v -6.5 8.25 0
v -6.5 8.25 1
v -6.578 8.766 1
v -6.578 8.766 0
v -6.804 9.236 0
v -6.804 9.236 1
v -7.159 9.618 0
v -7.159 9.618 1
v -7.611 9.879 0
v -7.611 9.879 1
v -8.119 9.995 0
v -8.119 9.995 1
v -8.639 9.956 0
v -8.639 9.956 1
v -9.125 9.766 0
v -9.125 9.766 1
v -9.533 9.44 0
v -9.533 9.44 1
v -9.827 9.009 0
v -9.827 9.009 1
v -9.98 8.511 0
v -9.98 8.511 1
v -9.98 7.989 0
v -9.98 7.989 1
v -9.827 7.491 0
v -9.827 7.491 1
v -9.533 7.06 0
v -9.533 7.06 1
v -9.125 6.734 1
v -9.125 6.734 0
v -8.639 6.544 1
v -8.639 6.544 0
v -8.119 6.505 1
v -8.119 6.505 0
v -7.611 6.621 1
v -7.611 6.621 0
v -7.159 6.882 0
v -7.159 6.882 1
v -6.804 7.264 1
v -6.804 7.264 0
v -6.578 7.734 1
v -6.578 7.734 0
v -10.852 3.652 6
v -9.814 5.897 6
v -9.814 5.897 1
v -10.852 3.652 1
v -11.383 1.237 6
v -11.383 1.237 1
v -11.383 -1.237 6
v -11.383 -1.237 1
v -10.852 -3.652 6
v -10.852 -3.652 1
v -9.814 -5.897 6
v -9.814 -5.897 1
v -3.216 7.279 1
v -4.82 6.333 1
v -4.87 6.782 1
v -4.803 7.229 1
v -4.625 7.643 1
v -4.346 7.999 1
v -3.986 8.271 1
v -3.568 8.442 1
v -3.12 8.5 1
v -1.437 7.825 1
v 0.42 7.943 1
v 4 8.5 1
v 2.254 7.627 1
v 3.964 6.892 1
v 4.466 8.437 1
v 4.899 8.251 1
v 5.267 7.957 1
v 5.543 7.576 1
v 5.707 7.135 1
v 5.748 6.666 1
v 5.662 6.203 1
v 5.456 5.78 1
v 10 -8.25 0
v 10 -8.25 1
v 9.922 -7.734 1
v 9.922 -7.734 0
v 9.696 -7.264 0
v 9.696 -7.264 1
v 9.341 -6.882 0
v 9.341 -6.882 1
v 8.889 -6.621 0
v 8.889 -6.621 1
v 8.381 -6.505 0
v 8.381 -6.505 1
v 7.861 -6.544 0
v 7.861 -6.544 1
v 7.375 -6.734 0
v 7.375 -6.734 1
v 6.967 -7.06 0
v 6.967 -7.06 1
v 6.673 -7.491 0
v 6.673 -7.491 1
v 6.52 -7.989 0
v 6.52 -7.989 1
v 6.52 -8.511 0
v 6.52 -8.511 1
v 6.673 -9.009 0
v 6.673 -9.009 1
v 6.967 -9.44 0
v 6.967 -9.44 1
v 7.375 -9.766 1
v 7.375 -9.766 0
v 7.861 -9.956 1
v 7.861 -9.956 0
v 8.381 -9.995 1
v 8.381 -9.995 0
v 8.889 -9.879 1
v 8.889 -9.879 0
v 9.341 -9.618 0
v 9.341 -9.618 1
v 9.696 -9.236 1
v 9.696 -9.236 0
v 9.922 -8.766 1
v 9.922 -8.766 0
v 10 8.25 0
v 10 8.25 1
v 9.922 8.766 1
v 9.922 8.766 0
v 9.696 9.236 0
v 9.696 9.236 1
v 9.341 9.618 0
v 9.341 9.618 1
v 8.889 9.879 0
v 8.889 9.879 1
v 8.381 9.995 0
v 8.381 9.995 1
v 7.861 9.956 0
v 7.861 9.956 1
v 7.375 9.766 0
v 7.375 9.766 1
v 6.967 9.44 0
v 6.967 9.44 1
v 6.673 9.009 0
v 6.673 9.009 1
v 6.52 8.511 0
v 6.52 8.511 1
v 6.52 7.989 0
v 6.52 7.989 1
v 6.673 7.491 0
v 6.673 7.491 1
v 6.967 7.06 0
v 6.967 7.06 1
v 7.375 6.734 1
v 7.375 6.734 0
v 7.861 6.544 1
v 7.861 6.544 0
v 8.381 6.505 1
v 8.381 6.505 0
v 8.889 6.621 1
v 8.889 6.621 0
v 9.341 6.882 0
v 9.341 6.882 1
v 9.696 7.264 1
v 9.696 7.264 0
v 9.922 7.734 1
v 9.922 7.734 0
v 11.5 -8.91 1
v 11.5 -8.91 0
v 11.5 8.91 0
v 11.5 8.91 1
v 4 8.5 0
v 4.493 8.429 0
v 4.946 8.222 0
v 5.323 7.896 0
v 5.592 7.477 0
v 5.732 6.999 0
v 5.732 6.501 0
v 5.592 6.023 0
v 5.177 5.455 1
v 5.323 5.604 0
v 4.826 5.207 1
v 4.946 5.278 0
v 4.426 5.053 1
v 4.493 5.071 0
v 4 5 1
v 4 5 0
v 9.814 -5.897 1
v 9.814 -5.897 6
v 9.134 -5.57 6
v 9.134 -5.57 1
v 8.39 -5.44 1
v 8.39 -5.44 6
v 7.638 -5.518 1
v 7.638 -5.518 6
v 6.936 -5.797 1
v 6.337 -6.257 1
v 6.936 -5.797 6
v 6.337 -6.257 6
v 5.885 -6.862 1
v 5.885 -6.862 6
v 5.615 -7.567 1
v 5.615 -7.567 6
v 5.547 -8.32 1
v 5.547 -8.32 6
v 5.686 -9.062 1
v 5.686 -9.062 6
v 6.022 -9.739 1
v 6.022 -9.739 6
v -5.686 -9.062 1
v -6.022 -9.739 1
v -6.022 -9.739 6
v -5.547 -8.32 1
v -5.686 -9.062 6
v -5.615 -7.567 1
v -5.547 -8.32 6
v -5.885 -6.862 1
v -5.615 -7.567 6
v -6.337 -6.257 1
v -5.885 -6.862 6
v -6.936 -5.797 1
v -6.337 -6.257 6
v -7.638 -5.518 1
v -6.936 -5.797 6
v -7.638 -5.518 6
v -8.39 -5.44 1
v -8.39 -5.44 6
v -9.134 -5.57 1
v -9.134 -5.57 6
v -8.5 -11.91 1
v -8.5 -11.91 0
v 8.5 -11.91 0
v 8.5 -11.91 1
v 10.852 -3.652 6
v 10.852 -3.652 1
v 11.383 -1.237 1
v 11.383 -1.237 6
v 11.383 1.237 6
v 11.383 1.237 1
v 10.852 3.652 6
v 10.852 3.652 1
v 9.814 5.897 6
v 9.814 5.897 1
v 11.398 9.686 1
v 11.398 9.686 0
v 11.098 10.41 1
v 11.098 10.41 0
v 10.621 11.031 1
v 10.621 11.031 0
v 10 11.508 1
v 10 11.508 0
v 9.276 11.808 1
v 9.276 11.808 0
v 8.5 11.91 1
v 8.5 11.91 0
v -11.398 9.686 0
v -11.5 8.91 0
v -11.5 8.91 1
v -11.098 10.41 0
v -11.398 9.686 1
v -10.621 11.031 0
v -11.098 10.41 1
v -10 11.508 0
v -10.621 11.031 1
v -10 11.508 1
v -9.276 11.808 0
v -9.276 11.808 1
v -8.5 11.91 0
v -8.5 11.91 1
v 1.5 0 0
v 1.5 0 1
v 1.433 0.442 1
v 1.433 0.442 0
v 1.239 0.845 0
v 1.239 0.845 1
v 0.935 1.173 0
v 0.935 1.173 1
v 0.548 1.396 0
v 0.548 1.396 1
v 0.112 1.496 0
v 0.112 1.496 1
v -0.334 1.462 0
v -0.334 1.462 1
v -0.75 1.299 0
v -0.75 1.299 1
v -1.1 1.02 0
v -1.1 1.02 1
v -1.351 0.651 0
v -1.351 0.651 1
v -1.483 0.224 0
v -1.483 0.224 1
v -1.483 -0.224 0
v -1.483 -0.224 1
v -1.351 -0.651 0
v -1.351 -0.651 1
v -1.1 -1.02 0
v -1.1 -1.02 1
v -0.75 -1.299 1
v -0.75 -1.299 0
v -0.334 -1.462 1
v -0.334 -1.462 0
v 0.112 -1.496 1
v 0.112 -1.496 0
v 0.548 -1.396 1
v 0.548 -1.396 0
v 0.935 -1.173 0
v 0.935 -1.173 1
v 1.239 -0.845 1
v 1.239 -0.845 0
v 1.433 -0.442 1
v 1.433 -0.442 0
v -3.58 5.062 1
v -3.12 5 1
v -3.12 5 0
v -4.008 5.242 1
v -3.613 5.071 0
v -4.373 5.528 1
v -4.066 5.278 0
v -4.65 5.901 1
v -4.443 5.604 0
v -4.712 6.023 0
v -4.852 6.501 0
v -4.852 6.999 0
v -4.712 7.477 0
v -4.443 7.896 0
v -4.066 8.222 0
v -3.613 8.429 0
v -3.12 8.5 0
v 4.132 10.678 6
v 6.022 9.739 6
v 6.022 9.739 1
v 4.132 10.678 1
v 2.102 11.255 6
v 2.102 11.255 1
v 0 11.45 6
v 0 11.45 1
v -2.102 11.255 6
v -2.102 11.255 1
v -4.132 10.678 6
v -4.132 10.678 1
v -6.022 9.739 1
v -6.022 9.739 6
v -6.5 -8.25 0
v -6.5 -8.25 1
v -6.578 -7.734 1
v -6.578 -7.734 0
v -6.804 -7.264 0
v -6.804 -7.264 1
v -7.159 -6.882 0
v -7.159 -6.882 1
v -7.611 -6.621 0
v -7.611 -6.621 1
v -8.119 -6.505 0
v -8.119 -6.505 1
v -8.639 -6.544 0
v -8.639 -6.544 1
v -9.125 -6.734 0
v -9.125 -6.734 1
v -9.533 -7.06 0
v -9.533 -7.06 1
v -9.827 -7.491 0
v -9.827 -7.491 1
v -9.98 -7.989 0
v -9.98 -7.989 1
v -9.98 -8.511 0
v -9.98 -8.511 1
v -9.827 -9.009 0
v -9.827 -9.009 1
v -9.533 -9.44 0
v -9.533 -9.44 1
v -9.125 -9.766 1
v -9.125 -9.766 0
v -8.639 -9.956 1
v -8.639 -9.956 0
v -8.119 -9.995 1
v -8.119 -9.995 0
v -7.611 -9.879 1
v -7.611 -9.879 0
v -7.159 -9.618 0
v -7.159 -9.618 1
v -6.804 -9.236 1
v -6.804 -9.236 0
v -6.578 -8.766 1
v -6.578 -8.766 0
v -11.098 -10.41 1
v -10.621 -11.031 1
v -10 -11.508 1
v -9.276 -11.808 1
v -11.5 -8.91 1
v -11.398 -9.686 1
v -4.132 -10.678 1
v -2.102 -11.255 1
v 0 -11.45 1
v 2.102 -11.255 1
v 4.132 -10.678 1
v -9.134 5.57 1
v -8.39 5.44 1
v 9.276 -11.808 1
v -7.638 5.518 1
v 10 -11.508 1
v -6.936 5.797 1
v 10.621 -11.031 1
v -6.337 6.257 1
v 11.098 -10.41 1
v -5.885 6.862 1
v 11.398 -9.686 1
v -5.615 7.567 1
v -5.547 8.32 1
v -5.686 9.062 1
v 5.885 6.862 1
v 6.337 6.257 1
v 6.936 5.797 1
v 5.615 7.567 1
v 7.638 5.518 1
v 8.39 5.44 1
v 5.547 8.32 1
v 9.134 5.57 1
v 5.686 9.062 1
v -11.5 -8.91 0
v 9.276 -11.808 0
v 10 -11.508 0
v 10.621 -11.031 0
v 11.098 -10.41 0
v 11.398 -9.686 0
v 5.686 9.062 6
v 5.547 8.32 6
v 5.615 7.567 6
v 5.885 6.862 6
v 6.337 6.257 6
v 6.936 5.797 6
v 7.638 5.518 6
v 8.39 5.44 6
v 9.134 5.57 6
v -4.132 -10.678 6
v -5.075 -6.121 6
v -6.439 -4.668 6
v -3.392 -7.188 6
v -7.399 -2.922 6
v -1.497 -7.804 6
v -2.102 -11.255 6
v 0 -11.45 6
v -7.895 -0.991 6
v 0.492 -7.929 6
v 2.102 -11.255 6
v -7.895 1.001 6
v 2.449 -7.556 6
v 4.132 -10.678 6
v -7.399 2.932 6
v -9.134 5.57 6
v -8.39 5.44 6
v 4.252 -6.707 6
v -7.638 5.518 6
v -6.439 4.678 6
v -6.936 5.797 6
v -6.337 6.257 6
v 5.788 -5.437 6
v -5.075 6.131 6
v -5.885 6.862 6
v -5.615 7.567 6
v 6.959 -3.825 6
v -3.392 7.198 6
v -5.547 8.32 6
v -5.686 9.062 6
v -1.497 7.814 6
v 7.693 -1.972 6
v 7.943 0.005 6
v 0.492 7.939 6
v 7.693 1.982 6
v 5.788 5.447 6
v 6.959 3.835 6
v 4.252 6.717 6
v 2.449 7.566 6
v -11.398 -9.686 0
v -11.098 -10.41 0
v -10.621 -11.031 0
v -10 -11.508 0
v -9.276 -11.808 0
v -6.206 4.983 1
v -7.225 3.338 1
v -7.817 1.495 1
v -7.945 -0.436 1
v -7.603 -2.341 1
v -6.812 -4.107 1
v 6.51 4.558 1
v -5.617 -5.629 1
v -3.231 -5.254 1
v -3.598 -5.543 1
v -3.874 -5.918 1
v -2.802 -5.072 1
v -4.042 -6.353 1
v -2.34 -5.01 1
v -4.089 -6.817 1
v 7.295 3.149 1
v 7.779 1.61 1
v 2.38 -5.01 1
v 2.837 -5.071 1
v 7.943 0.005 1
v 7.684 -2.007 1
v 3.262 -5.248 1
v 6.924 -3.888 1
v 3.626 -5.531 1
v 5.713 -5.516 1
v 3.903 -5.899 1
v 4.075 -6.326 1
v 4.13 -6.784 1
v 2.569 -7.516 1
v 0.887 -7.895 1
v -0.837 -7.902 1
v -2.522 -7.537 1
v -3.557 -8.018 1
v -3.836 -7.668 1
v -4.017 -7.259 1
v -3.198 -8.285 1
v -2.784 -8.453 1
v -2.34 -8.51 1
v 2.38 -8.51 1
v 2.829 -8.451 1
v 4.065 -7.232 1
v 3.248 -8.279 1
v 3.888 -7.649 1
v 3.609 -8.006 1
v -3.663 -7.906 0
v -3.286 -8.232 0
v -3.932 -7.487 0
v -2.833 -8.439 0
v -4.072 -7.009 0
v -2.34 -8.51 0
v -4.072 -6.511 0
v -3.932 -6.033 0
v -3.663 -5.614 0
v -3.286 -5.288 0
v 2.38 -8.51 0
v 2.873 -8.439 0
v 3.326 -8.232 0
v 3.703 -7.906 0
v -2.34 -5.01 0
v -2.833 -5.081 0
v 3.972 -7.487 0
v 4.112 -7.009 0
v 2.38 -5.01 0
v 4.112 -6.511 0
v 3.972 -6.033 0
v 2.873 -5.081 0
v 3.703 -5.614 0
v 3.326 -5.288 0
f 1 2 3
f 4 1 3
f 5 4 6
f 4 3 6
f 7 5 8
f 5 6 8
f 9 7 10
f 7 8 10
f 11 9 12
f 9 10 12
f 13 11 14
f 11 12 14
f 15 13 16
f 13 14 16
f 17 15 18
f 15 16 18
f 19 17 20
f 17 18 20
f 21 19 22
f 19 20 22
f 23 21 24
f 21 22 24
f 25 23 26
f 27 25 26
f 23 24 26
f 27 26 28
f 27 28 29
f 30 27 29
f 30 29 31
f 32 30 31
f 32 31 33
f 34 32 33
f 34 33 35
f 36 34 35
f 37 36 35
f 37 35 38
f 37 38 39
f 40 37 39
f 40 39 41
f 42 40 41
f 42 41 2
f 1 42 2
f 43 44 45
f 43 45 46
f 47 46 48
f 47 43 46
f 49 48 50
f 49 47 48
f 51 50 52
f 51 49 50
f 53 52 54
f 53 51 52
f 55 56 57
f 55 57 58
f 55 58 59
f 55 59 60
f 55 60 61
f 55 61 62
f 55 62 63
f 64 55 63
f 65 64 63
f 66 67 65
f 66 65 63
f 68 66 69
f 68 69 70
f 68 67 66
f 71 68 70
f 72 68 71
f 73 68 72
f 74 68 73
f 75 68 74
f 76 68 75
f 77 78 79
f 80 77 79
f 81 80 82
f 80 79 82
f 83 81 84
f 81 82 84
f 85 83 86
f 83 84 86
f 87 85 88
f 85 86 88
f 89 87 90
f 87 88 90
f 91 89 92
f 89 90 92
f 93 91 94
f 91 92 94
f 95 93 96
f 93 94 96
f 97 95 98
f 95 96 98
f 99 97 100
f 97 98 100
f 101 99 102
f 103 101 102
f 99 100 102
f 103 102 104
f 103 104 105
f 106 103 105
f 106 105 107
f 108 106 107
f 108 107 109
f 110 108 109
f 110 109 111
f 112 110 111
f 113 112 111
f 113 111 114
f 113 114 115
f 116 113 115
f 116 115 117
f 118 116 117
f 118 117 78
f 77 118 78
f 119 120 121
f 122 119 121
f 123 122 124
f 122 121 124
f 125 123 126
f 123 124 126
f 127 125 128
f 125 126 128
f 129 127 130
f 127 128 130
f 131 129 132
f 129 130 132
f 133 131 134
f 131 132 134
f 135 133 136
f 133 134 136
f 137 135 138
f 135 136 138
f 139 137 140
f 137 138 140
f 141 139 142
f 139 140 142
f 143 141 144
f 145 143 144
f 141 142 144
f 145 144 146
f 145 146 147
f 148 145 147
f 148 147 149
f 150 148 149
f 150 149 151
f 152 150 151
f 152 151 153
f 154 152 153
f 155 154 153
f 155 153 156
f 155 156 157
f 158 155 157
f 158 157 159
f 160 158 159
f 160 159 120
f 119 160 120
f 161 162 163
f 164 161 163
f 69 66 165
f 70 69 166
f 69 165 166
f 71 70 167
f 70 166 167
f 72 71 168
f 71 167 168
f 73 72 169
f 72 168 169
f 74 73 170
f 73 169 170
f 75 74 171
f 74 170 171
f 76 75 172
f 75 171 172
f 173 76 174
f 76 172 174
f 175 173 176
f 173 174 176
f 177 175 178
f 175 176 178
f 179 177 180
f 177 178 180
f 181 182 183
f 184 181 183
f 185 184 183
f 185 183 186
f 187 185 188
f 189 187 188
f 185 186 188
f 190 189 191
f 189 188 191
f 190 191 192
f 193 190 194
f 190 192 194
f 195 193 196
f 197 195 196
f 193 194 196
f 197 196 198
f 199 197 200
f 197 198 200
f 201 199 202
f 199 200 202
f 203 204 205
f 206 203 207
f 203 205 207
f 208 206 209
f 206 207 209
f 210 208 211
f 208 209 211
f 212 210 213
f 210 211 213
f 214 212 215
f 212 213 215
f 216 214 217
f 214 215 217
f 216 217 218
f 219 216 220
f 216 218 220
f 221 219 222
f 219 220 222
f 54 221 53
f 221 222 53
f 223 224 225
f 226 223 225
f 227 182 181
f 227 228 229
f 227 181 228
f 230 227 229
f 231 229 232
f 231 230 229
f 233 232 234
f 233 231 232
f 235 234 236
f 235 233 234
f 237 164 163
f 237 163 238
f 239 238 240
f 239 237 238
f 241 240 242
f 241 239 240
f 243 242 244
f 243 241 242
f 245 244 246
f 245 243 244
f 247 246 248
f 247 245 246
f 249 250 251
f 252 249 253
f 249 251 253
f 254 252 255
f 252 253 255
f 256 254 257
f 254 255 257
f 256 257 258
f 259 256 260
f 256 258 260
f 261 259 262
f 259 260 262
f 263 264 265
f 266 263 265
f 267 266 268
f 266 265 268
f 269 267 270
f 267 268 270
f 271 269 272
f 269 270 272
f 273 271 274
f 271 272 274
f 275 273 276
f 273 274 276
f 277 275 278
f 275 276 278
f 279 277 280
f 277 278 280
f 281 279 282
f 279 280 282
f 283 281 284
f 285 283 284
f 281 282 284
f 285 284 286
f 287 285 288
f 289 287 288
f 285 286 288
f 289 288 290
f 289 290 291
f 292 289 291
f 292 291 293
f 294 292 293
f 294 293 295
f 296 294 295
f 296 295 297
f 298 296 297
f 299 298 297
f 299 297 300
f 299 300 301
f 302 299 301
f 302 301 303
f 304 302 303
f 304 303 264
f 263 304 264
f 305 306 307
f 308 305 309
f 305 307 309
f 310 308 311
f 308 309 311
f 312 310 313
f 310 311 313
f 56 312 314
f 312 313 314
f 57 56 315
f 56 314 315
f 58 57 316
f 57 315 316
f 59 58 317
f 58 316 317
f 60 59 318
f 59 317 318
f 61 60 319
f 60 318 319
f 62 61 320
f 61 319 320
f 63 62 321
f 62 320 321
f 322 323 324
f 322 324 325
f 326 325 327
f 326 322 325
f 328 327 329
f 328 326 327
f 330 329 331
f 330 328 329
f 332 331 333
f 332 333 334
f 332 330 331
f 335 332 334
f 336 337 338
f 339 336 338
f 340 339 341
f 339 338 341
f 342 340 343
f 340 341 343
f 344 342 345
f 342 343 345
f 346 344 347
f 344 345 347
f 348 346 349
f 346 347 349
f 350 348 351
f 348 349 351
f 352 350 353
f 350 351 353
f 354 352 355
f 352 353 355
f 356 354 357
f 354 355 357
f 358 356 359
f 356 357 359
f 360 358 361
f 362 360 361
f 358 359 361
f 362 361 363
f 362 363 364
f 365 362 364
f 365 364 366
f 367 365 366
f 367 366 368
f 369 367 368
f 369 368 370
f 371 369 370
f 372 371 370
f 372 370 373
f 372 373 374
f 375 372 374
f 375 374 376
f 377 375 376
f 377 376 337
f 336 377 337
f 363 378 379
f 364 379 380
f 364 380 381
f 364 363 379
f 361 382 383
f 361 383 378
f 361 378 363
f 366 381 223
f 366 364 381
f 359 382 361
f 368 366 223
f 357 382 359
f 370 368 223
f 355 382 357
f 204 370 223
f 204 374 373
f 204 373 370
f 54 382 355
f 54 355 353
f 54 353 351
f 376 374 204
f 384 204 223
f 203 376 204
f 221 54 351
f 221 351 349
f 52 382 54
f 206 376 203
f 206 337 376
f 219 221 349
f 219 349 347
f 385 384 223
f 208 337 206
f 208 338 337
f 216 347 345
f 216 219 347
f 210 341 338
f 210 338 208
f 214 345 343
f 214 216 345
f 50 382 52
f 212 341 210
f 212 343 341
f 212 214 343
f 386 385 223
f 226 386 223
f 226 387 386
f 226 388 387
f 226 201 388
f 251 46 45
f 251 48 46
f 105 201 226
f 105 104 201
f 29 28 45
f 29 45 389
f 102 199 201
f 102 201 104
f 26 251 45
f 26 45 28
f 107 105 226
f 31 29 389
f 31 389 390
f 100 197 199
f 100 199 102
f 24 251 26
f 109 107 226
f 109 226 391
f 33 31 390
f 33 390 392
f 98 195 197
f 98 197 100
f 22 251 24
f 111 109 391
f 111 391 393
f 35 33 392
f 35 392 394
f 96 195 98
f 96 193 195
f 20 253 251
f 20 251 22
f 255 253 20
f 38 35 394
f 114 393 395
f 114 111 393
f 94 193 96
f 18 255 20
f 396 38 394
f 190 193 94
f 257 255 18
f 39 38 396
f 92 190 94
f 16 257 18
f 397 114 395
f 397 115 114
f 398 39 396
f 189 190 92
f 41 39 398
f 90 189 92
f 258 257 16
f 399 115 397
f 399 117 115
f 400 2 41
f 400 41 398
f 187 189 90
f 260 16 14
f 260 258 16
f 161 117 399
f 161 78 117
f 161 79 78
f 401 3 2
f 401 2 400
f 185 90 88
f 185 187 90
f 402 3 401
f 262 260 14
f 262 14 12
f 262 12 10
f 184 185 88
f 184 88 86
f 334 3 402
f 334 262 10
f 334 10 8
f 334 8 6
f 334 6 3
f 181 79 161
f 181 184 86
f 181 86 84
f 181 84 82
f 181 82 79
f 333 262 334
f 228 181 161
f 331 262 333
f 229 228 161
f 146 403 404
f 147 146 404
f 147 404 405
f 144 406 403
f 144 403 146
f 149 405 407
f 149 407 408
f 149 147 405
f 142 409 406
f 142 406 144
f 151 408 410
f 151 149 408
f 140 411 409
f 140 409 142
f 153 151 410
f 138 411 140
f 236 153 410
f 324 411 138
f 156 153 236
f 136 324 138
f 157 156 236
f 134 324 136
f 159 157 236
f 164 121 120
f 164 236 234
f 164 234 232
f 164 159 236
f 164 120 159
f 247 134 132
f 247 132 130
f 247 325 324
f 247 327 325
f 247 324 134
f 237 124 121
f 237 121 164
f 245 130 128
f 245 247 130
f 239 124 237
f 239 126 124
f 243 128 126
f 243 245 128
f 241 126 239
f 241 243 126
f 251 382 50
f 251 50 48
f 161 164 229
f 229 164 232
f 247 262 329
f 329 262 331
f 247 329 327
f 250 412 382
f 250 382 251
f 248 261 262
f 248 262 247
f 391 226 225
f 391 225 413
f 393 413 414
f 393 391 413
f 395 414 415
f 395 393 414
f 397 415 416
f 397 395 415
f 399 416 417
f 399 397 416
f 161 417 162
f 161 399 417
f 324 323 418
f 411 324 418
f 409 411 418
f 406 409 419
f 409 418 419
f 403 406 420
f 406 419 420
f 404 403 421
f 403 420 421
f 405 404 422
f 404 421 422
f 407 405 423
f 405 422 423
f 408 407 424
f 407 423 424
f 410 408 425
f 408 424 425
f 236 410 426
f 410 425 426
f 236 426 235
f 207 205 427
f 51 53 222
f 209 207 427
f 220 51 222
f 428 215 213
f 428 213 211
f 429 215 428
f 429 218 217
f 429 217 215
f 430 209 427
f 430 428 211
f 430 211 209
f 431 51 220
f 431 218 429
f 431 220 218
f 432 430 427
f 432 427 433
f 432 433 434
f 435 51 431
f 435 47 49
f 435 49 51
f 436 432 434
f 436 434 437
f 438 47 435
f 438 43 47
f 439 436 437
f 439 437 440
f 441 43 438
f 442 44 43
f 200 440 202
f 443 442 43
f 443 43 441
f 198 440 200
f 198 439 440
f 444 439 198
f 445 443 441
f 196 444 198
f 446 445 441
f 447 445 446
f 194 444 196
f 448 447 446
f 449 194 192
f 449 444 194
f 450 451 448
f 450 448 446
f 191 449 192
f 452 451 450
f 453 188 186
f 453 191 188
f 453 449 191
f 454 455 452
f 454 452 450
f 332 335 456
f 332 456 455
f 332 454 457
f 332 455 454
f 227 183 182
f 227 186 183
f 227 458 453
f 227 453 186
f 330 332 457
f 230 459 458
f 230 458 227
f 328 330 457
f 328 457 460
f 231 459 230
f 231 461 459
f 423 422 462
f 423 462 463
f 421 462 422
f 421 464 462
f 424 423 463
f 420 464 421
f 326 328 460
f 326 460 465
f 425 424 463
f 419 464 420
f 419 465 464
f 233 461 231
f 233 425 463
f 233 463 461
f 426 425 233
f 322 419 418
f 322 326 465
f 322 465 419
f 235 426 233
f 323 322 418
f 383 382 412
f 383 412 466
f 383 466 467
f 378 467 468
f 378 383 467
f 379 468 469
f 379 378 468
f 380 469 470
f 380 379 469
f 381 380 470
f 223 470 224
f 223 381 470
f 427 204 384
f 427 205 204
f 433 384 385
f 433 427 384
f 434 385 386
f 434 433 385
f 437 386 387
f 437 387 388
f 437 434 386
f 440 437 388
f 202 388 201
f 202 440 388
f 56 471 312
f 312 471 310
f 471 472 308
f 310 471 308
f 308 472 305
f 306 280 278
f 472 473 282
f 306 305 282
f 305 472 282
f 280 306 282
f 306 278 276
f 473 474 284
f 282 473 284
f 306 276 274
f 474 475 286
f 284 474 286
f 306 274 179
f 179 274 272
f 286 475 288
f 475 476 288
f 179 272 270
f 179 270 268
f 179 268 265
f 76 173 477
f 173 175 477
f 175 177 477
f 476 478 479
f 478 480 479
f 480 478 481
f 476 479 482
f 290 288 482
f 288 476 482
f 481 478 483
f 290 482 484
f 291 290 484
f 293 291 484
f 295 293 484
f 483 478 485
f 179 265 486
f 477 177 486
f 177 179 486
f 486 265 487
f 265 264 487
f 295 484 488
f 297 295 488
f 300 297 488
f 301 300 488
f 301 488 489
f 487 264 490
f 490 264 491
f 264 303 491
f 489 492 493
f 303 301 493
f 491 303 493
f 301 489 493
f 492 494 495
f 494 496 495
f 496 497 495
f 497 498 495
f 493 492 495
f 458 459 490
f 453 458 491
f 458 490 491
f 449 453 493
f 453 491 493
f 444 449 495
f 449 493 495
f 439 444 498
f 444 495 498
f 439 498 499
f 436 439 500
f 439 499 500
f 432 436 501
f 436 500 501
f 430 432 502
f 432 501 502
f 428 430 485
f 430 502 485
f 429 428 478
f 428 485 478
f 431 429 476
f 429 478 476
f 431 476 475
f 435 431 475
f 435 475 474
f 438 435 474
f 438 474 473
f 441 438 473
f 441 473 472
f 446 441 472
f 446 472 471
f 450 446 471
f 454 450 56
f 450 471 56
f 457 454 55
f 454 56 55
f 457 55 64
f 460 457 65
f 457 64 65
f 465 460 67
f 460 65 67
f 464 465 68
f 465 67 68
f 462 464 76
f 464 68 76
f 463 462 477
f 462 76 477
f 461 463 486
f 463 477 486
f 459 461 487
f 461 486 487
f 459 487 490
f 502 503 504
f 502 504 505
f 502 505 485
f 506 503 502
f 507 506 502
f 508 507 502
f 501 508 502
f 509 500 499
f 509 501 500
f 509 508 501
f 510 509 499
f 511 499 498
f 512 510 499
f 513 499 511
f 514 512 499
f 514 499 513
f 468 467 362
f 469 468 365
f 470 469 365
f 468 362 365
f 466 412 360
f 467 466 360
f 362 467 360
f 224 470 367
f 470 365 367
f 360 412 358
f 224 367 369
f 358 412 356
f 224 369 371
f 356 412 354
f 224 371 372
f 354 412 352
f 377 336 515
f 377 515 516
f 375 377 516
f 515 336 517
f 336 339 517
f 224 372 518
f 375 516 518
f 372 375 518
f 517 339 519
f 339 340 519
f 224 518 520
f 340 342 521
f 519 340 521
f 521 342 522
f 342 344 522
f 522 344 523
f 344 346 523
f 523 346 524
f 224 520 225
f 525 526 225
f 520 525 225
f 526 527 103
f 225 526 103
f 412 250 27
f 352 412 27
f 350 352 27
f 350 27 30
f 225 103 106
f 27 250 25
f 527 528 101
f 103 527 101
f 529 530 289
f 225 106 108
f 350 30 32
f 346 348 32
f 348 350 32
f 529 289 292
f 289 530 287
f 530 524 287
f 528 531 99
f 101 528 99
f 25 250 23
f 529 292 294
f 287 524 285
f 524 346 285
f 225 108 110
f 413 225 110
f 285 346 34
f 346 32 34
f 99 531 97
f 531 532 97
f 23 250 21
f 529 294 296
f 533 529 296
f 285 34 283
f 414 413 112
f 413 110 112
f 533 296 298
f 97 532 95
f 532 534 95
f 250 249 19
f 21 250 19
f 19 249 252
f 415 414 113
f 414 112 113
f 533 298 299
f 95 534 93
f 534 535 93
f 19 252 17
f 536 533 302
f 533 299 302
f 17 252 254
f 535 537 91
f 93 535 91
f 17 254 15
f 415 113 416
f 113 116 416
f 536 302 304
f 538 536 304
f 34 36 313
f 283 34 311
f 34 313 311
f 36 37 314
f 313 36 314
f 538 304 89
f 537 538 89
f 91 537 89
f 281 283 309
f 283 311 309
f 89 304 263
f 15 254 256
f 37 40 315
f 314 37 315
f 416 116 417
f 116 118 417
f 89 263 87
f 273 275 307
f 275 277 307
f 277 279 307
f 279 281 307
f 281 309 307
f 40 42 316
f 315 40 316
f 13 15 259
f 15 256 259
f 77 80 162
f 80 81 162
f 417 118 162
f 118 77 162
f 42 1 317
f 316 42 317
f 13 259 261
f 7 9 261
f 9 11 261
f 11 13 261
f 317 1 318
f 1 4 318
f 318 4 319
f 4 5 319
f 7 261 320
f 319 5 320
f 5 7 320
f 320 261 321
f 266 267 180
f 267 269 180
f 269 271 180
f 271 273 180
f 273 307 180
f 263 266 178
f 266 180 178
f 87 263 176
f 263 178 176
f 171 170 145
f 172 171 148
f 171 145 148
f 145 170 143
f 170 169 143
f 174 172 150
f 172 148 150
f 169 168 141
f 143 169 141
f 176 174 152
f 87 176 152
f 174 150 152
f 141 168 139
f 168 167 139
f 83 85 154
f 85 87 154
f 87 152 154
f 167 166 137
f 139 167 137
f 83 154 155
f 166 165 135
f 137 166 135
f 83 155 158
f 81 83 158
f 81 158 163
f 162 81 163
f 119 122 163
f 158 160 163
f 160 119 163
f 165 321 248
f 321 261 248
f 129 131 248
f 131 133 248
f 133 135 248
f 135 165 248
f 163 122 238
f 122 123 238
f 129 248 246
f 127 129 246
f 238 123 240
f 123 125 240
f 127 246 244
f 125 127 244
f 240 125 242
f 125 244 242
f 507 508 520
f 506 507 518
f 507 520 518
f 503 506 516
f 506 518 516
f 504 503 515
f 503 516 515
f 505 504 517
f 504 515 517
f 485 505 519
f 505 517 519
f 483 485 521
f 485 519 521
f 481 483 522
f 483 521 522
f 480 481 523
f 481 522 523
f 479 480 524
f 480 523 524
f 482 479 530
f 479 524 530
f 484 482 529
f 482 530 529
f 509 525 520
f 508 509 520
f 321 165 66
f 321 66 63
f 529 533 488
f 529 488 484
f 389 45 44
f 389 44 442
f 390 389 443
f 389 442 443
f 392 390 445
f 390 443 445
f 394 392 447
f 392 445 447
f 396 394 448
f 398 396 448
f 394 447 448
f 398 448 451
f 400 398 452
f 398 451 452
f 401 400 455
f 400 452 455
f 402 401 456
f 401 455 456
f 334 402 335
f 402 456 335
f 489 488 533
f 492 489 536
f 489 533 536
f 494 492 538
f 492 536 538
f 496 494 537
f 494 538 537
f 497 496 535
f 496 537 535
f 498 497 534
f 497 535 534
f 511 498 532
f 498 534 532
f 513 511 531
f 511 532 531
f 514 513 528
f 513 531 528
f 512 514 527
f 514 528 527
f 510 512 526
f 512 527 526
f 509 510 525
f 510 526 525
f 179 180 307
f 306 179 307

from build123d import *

# Parameters (mm, degrees)
SKETCH_W        = 23
SKETCH_H        = 23.82
PAD_DEPTH       = 6
FILLET_R        = 3
POCKET_DEPTH    = 1
SKETCH001_W     = 40
SKETCH001_H     = 40
SKETCH001_R     = 11.45
POCKET001_DEPTH = 5
SKETCH004_R     = 7.95
POCKET002_DEPTH = 5
SKETCH006_R     = 1.75
HOLE_DEPTH      = 6.001
SKETCH007_R     = 2.75
POCKET004_DEPTH = 5
SKETCH008_R     = 1.5
HOLE001_DEPTH   = 25


with BuildPart() as part:
    # Sketch → Pad (new body)
    with BuildSketch(Plane.XY):
        Rectangle(SKETCH_W, SKETCH_H)
    extrude(amount=PAD_DEPTH)

    # Fillet
    fillet_edges = [part.edges().sort_by_distance(p)[0] for p in [
        (11.5, -11.91, 3),
        (-11.5, -11.91, 3),
        (11.5, 11.91, 3),
        (-11.5, 11.91, 3),
    ]]
    fillet(fillet_edges, radius=FILLET_R)

    # Sketch003 → Pocket (cut)
    with BuildSketch(Plane(origin=(0, 0, 0), x_dir=(1, 0, 0), z_dir=(0, 0, -1))):
        with BuildLine():
            ThreePointArc((4, -8.5), (5.75, -6.75), (4, -5))
            Line((4, -5), (-3.12, -5))
            ThreePointArc((-3.12, -5), (-4.87, -6.75), (-3.12, -8.5))
            Line((4, -8.5), (-3.12, -8.5))
        make_face()
        with BuildLine():
            ThreePointArc((2.38, 5.01), (4.13, 6.76), (2.38, 8.51))
            Line((2.38, 8.51), (-2.34, 8.51))
            ThreePointArc((-2.34, 8.51), (-4.09, 6.76), (-2.34, 5.01))
            Line((2.38, 5.01), (-2.34, 5.01))
        make_face()
    extrude(amount=-POCKET_DEPTH, mode=Mode.SUBTRACT)

    # Sketch001 (on Face6 of Pad) → Pocket001 (cut)
    with BuildSketch(Plane.XY.offset(6)):
        Rectangle(SKETCH001_W, SKETCH001_H)
        Circle(SKETCH001_R, mode=Mode.SUBTRACT)
    extrude(amount=-POCKET001_DEPTH, mode=Mode.SUBTRACT)

    # Sketch004 (on Face21 of Pocket001) → Pocket002 (cut)
    with BuildSketch(Plane(origin=(0, 0, 1), x_dir=(1, 0, 0), z_dir=(0, 0, -1))):
        with Locations((-0.007428, -0.004957)):
            Circle(SKETCH004_R)
    extrude(amount=-POCKET002_DEPTH, mode=Mode.SUBTRACT)

    # Sketch006 → Hole (cut, through all)
    with BuildSketch(Plane.XY.offset(6)):
        with Locations((-8.25, 8.25)):
            Circle(SKETCH006_R)
        with Locations((8.25, 8.25)):
            Circle(SKETCH006_R)
        with Locations((8.25, -8.25)):
            Circle(SKETCH006_R)
        with Locations((-8.25, -8.25)):
            Circle(SKETCH006_R)
    extrude(amount=-HOLE_DEPTH, mode=Mode.SUBTRACT)

    # Sketch007 → Pocket004 (cut)
    with BuildSketch(Plane.XY.offset(6)):
        with Locations((-8.293696, 8.188751)):
            Circle(SKETCH007_R)
        with Locations((8.293696, 8.188751)):
            Circle(SKETCH007_R)
        with Locations((8.293696, -8.188751)):
            Circle(SKETCH007_R)
        with Locations((-8.293696, -8.188751)):
            Circle(SKETCH007_R)
    extrude(amount=-POCKET004_DEPTH, mode=Mode.SUBTRACT)

    # Sketch008 (on Face6 of Pad) → Hole001 (cut)
    with BuildSketch(Plane.XY.offset(6)):
        Circle(SKETCH008_R)
    extrude(amount=-HOLE001_DEPTH, mode=Mode.SUBTRACT)


solid = part.part
